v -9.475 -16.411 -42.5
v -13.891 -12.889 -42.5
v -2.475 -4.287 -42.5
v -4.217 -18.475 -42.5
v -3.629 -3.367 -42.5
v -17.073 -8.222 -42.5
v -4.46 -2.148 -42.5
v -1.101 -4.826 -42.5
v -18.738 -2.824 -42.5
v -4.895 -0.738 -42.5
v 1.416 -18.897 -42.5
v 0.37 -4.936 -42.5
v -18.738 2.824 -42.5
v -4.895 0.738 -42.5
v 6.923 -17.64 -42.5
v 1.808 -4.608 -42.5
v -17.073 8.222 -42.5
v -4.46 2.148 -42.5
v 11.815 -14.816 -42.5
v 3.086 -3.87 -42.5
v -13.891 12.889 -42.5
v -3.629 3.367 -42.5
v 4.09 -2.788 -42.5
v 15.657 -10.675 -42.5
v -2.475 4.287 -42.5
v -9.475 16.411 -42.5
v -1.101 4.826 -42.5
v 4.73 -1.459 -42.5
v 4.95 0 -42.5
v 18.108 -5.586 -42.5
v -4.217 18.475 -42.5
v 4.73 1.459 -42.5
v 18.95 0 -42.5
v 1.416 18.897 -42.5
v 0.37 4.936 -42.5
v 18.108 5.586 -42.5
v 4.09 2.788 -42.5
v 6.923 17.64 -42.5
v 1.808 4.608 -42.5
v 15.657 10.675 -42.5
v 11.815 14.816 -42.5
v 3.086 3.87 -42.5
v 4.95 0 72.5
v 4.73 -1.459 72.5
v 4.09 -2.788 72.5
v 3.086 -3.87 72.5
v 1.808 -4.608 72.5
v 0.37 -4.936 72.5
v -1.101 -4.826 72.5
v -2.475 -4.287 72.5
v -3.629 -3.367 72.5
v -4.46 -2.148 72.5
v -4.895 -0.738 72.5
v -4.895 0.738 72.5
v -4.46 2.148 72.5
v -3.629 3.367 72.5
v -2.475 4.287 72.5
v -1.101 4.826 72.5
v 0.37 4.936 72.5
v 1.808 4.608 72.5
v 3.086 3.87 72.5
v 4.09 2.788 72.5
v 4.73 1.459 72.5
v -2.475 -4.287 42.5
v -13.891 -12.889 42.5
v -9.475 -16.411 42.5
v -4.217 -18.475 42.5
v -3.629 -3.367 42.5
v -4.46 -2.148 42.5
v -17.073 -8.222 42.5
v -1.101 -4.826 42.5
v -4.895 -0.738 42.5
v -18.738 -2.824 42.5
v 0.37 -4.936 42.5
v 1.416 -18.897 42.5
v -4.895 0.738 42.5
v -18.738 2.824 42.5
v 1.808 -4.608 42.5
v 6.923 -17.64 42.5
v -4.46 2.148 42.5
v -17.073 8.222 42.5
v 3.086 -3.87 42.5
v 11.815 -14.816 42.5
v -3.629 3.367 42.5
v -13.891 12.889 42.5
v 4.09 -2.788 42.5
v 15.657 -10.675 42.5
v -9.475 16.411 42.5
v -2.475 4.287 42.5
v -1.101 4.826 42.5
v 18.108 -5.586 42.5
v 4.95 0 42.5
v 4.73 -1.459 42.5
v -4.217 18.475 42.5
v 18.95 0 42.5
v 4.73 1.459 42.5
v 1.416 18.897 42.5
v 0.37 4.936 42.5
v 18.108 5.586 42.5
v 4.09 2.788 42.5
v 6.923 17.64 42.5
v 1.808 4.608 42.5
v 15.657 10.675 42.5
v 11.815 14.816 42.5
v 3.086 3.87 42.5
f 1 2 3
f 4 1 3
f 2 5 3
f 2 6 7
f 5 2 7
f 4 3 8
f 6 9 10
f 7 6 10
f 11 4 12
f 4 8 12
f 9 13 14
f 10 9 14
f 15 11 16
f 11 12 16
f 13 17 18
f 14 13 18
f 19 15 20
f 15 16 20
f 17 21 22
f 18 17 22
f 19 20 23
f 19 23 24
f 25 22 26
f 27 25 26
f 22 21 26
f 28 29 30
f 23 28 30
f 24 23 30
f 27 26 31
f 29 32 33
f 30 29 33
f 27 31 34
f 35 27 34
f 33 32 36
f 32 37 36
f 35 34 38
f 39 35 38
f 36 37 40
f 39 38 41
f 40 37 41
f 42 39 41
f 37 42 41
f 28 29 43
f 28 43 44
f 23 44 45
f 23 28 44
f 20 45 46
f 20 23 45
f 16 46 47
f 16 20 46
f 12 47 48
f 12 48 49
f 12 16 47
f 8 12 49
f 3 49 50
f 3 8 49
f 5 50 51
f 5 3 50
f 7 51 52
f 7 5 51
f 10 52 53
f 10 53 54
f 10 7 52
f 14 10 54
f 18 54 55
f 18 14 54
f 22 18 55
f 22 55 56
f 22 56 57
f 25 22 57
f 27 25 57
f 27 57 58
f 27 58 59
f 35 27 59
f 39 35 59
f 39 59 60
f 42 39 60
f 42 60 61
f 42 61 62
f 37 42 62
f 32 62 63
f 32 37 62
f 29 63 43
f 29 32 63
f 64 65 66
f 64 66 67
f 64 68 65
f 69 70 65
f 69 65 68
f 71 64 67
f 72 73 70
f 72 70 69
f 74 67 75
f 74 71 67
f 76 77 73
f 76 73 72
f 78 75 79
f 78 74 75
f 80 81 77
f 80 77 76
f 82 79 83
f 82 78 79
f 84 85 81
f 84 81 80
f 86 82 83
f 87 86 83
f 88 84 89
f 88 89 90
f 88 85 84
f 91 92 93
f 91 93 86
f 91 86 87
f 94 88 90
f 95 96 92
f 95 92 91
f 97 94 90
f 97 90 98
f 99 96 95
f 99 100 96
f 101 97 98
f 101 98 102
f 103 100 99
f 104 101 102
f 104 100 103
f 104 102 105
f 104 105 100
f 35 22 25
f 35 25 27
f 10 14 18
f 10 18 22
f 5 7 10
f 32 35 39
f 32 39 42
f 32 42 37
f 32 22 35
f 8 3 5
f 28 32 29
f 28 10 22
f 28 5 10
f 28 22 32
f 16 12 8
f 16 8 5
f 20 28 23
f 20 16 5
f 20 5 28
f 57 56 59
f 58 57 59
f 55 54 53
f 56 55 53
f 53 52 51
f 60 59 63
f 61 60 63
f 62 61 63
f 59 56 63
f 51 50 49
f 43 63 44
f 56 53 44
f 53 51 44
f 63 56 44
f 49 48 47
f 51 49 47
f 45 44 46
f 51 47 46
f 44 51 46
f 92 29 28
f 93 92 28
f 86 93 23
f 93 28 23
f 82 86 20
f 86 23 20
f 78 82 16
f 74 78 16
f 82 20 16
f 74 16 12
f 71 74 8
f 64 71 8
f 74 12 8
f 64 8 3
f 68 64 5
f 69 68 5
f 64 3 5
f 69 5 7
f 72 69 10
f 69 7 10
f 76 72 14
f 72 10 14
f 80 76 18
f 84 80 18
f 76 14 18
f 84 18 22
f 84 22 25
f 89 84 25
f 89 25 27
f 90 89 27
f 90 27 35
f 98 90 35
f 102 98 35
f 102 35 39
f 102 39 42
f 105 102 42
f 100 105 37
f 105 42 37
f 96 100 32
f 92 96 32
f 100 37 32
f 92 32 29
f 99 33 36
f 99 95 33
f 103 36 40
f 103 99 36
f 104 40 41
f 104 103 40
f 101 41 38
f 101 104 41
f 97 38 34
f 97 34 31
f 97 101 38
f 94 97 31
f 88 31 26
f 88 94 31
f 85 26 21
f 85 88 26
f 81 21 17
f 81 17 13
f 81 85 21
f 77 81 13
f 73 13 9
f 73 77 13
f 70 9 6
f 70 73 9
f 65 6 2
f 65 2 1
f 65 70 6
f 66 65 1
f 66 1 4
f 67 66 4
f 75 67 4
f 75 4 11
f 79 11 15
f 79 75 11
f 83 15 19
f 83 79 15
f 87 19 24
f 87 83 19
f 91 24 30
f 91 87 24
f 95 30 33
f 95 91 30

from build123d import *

# Parameters (mm, degrees)
F0_R     = 18.95
F1_DEPTH = 42.5
F4_R     = 4.95
F5_DEPTH = 85
F6_R     = 4.95
F7_DEPTH = 115


with BuildPart() as f1:
    # F0 (on Top) → F1 (new body, symmetric)
    with BuildSketch(Plane.XY):
        Circle(F0_R)
    extrude(amount=F1_DEPTH, both=True)

    # F4 (on face) → F5 (cut, through all)
    with BuildSketch(Plane(origin=(0, 0, -42.5), x_dir=(1, 0, 0), z_dir=(0, 0, -1))):
        Circle(F4_R)
    extrude(amount=-F5_DEPTH, mode=Mode.SUBTRACT)


with BuildPart() as f7:
    # F6 (on face) → F7 (new body)
    with BuildSketch(Plane(origin=(0, 0, -42.5), x_dir=(1, 0, 0), z_dir=(0, 0, -1))):
        Circle(F6_R)
    extrude(amount=-F7_DEPTH)


solid = Compound([f1.part, f7.part])
